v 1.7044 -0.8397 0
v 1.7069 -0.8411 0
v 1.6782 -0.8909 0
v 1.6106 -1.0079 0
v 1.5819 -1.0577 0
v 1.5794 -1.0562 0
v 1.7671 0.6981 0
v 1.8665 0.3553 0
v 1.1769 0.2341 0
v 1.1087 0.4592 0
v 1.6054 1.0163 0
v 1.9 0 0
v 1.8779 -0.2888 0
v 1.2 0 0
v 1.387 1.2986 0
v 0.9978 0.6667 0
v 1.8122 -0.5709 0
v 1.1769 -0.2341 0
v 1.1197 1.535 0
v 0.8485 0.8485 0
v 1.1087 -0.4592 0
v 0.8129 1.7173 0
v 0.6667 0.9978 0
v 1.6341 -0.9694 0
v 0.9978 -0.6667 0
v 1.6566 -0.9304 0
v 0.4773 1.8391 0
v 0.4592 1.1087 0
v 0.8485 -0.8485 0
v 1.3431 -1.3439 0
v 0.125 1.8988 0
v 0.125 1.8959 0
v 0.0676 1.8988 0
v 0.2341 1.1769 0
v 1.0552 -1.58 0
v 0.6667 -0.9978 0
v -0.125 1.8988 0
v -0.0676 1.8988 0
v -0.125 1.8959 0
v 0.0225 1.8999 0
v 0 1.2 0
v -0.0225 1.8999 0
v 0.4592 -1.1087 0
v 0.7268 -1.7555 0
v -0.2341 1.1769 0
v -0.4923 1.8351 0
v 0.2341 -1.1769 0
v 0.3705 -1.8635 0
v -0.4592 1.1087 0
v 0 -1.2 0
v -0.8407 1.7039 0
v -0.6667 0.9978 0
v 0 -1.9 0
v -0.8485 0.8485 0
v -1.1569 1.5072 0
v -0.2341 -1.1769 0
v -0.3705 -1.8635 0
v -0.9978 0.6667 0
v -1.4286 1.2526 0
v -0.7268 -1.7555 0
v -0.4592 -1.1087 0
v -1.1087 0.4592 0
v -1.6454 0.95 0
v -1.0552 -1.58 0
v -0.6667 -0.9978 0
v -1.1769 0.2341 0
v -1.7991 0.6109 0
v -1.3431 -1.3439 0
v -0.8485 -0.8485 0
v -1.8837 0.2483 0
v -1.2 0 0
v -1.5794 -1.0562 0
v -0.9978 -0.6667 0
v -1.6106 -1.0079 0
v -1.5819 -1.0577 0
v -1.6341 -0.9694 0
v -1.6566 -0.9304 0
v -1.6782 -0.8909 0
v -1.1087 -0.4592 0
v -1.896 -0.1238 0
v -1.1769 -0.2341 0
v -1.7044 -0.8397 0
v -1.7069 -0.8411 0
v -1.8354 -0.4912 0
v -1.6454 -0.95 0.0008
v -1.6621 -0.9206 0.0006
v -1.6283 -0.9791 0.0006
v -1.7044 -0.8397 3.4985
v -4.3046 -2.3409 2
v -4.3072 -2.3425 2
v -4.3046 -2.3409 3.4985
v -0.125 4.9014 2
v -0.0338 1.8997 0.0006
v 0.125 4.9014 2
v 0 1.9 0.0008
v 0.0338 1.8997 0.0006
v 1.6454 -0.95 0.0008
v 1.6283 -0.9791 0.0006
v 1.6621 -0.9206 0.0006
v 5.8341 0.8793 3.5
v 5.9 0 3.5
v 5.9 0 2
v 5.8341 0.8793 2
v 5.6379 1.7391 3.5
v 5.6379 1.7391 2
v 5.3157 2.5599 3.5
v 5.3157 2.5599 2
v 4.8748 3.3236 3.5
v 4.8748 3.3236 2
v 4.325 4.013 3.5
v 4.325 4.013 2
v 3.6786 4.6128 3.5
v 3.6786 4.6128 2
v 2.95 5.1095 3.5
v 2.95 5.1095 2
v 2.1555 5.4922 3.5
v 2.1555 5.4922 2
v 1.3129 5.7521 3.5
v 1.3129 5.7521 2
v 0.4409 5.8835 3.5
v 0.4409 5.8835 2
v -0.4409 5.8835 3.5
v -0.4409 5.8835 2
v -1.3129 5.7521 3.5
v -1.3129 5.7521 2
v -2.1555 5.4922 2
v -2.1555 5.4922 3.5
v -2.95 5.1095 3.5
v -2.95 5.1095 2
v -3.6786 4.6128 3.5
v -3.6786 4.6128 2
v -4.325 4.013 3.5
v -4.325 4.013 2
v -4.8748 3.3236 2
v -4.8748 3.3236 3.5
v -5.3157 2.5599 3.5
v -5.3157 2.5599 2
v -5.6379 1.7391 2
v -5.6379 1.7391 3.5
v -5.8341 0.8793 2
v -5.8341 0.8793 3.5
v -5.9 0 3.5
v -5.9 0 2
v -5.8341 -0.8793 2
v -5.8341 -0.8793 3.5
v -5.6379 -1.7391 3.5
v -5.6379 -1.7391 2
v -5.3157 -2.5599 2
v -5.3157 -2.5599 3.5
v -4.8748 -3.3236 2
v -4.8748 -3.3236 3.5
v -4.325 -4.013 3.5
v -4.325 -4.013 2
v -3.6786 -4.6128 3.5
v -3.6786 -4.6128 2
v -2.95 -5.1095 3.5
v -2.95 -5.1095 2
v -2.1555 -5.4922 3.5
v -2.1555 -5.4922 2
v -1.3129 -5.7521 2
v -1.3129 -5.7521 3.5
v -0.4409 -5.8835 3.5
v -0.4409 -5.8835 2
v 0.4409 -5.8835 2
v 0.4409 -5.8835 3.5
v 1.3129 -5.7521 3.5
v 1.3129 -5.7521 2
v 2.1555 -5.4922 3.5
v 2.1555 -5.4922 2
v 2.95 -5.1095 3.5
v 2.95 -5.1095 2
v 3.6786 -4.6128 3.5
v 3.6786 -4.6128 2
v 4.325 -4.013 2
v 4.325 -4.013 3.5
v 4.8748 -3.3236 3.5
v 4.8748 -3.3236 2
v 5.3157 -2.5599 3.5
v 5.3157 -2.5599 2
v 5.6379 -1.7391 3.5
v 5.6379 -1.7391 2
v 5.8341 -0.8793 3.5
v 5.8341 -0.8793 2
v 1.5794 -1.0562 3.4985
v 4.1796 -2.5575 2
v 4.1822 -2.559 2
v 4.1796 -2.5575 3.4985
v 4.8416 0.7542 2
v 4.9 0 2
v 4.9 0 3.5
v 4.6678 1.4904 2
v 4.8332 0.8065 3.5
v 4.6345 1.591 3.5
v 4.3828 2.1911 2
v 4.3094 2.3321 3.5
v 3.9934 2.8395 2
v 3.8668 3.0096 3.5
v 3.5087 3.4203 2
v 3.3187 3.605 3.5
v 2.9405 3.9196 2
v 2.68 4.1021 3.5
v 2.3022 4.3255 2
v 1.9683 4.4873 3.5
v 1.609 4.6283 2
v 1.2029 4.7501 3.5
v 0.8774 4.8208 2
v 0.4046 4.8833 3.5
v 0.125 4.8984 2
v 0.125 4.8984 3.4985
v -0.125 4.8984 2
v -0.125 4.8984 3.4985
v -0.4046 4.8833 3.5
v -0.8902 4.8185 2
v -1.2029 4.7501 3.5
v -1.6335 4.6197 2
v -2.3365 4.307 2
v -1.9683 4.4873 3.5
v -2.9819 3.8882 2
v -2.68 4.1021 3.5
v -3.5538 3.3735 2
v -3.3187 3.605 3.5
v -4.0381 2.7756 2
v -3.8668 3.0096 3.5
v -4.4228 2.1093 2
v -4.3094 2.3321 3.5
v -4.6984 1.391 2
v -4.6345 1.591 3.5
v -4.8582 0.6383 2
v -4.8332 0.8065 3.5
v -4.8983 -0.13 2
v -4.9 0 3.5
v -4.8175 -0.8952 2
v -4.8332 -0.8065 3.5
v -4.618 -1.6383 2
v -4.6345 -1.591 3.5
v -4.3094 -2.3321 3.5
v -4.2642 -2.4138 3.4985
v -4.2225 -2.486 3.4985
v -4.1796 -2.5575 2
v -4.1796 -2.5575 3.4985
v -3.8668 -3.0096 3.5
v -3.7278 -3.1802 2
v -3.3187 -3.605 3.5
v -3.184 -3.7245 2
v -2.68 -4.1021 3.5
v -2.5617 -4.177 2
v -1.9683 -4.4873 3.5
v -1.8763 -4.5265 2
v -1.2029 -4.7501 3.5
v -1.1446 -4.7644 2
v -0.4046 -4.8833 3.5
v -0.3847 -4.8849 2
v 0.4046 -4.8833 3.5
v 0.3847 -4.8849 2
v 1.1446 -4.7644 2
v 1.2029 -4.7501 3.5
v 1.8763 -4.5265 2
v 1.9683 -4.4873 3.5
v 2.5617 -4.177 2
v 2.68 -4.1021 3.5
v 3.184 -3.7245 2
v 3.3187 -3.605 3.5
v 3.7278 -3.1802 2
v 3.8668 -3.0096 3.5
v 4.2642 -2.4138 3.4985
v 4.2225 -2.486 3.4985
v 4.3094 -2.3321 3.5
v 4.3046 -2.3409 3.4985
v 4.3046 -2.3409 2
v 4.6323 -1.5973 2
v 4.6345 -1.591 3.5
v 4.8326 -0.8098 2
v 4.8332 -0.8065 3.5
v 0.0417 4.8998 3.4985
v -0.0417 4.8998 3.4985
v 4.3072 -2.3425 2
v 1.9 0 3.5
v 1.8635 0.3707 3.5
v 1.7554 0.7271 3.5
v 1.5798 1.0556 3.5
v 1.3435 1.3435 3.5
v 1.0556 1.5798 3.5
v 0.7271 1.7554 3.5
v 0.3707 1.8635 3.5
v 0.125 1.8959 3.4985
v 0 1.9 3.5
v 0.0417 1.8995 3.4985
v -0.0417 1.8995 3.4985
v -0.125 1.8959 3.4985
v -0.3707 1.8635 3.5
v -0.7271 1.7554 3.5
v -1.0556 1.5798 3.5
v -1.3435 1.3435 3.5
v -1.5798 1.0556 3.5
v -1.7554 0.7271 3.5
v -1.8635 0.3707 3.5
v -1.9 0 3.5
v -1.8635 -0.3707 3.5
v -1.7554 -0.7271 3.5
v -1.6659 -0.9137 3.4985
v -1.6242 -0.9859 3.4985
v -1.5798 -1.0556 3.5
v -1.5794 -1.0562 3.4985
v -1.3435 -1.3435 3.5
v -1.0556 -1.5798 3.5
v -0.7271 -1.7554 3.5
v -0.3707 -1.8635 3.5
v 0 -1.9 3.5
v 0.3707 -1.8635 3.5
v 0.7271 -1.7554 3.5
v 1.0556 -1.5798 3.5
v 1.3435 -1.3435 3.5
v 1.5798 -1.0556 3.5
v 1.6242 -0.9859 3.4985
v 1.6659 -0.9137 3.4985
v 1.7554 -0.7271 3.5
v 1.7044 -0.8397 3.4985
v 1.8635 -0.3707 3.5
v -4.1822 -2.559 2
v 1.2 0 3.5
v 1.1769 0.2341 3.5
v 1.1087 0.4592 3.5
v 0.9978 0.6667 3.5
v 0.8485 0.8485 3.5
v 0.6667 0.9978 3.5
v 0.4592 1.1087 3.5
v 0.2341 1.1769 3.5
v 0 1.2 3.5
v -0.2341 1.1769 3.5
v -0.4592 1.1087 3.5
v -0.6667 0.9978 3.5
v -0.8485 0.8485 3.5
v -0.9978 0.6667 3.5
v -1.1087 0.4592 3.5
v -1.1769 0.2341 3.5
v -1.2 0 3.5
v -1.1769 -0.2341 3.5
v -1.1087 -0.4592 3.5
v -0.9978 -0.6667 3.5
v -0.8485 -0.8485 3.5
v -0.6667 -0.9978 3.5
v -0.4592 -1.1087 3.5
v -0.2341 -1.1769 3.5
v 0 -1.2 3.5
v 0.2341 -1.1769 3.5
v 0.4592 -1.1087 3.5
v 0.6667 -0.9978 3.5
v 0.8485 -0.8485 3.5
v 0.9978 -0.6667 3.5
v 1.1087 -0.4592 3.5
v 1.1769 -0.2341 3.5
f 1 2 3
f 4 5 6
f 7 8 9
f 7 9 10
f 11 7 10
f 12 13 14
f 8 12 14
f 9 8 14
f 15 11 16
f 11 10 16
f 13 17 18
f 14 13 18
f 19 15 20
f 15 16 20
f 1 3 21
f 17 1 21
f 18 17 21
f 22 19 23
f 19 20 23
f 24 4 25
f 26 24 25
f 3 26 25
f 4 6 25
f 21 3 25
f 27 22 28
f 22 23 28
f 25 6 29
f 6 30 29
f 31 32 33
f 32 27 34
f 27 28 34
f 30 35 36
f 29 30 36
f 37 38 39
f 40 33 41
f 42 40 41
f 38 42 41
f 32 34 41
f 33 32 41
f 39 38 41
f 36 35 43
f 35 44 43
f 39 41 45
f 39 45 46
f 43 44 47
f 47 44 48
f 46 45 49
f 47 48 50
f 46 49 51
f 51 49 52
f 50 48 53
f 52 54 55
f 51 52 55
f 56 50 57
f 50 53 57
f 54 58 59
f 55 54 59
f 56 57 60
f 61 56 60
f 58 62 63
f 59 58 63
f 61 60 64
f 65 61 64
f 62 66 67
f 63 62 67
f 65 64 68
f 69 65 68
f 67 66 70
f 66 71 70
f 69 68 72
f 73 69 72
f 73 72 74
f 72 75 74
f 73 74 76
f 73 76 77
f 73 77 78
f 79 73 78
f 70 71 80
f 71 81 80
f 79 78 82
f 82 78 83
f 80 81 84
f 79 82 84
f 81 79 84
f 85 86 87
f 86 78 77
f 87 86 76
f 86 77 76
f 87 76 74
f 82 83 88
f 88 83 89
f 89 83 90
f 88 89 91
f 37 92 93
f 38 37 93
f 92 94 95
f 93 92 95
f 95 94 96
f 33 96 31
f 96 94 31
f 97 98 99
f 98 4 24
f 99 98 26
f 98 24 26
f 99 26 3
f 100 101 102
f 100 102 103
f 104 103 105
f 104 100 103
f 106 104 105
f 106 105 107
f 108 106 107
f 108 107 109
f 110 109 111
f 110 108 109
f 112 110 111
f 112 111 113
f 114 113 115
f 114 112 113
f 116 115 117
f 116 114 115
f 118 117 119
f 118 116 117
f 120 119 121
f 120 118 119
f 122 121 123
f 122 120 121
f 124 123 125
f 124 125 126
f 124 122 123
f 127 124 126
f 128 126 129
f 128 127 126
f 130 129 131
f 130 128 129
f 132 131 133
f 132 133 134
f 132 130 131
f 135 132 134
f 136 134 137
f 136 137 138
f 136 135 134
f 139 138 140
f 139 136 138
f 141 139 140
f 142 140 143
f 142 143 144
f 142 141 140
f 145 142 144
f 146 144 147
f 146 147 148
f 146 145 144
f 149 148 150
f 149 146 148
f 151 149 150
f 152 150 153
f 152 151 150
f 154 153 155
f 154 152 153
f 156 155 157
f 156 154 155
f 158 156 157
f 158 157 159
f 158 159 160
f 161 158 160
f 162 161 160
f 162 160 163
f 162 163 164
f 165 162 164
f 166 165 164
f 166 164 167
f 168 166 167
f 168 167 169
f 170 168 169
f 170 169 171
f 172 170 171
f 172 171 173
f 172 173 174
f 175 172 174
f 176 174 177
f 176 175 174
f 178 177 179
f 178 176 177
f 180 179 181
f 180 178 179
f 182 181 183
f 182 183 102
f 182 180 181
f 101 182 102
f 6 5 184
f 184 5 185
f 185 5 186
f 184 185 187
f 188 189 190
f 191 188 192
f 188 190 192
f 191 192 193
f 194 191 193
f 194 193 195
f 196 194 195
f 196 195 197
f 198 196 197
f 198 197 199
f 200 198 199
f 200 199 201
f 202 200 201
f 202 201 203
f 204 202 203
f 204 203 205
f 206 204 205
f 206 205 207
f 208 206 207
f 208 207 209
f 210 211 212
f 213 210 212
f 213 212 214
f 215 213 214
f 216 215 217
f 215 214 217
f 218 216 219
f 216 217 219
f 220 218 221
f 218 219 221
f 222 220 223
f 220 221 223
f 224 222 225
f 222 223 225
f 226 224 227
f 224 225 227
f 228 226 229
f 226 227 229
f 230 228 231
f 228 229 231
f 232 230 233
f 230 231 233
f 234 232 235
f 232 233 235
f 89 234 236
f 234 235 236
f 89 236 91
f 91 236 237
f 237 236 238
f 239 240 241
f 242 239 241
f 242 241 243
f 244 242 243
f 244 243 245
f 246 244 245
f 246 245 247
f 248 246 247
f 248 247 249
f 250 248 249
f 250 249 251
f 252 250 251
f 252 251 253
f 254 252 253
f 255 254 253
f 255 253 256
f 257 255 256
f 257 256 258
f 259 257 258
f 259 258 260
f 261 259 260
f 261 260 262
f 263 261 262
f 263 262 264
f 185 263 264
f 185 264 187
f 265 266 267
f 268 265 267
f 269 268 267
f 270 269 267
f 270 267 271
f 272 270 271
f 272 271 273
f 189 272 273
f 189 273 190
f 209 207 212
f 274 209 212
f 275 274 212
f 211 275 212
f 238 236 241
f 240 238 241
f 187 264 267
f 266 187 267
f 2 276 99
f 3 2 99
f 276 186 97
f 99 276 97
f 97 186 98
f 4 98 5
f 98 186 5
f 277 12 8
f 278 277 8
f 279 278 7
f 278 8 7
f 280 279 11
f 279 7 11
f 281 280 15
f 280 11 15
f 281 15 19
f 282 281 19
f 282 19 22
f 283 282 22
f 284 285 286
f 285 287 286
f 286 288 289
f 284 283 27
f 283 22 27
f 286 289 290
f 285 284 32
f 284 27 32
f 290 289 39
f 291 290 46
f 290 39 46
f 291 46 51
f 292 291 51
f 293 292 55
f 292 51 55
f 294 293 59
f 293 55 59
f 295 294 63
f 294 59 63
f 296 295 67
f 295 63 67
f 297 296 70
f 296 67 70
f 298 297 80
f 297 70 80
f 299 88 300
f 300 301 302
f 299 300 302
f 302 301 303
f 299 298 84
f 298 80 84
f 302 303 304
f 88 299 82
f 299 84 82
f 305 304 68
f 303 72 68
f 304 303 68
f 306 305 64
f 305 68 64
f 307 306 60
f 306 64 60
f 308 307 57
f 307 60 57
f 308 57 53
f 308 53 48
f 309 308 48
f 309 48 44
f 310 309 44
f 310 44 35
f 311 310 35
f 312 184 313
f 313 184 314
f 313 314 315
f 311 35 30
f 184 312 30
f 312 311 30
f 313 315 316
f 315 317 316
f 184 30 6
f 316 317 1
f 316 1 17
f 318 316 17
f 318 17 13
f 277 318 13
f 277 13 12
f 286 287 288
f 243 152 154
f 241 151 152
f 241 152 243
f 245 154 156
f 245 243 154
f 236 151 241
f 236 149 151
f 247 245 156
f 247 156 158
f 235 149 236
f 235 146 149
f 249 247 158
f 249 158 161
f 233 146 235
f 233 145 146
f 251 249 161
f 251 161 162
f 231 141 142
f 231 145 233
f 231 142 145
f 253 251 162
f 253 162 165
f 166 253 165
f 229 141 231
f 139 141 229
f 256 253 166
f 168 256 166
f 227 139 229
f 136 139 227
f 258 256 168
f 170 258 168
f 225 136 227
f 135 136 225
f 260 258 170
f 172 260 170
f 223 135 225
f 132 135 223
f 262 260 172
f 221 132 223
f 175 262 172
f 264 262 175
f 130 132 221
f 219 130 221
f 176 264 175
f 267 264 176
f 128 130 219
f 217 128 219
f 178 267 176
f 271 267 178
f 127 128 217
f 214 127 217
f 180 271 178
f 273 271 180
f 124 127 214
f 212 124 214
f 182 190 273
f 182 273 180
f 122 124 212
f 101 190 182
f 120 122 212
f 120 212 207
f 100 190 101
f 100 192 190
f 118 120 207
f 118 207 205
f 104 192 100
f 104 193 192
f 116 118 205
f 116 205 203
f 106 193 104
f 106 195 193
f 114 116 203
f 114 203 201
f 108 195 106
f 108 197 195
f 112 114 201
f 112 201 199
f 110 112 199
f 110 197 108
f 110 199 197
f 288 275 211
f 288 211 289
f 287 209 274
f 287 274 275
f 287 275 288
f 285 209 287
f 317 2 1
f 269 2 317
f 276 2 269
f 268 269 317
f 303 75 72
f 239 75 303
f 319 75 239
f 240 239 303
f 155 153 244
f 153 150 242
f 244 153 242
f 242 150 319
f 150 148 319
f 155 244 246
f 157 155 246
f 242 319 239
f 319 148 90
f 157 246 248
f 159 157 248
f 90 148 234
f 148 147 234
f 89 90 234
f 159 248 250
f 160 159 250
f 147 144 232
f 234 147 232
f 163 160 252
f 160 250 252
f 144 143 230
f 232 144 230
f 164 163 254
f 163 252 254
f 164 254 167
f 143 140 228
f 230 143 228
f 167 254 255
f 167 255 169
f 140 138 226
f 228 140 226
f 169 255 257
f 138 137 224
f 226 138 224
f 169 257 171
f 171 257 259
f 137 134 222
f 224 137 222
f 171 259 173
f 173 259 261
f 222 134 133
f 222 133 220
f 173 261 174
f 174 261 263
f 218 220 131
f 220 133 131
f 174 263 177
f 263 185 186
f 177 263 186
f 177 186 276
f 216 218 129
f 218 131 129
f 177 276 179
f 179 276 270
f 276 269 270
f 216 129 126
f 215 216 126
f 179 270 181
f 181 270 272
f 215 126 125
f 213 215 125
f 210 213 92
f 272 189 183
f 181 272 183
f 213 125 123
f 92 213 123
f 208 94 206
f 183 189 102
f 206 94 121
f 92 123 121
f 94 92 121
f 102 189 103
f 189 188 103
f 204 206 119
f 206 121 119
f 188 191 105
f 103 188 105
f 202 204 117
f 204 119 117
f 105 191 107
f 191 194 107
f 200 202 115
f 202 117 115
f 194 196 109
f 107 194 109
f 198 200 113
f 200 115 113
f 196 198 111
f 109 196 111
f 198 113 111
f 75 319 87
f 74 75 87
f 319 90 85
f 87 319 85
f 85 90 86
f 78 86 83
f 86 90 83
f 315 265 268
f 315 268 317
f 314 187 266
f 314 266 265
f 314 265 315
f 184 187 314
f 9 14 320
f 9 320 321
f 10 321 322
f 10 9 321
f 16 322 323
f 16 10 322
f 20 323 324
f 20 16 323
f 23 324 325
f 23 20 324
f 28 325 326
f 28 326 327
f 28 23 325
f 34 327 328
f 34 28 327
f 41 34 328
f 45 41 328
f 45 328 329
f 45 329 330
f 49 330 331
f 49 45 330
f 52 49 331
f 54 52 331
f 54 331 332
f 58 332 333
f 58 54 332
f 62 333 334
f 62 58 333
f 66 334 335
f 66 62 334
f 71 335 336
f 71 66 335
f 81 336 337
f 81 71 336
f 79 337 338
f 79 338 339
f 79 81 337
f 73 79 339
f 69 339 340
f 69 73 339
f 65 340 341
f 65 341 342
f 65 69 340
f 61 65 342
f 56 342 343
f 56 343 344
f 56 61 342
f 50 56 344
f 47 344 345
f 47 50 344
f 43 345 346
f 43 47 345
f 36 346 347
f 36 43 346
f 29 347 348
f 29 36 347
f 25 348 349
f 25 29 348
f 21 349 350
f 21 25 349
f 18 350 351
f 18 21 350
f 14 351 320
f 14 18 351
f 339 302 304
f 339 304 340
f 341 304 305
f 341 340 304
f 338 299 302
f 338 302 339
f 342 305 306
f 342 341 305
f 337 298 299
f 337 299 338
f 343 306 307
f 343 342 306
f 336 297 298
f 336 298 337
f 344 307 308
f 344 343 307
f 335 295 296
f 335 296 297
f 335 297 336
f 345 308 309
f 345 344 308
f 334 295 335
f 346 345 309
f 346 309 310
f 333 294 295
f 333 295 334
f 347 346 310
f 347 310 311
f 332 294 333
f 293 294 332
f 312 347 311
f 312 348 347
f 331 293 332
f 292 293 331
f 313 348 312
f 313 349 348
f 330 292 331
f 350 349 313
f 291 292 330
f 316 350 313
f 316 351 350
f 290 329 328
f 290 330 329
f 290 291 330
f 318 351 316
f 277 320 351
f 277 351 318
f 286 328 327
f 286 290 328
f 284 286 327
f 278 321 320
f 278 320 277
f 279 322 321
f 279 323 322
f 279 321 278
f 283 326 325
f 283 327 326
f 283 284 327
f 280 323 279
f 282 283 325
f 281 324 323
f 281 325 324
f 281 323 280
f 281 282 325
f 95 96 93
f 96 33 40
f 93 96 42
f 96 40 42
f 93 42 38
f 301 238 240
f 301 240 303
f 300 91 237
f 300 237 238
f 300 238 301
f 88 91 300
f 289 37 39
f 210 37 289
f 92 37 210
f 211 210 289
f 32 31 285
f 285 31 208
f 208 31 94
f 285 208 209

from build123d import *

# Parameters (mm, degrees)
SKETCH1_R           = 1.9
SKETCH1_R_2         = 1.2
BOSS_EXTRUDE1_DEPTH = 3.5
SKETCH2_R           = 5.9
SKETCH2_R_2         = 4.9
BOSS_EXTRUDE2_DEPTH = 1.5
BOSS_EXTRUDE3_DEPTH = 0.125
CIRPATTERN1_COUNT   = 3


with BuildPart() as part:
    # Sketch1 → Boss-Extrude1 (new body)
    with BuildSketch(Plane.XY):
        Circle(SKETCH1_R)
        Circle(SKETCH1_R_2, mode=Mode.SUBTRACT)
    extrude(amount=BOSS_EXTRUDE1_DEPTH)



with BuildPart() as body_2:
    # Sketch2 → Boss-Extrude2 (new body)
    with BuildSketch(Plane.XY.offset(3.5)):
        Circle(SKETCH2_R)
        Circle(SKETCH2_R_2, mode=Mode.SUBTRACT)
    extrude(amount=-BOSS_EXTRUDE2_DEPTH)


with BuildPart() as part_1:
    add(part.part)

    add(body_2.part)  # Boss-Extrude3 merges body 2
    # Sketch7 → Boss-Extrude3 (add, symmetric)
    with BuildSketch(Plane(origin=(0, 0, 0), x_dir=(0, 0, -1), z_dir=(1, 0, 0))):
        Polygon((-3.498505426, 1.898798754), (-3.498505426, 4.906659039), (-2.003497041, 4.906659039), (0, 1.898798754), (0, 1.698798754), (-3.498505426, 1.698798754), align=None)
    boss_extrude3 = extrude(amount=BOSS_EXTRUDE3_DEPTH, both=True)

    # CirPattern1: Boss-Extrude3 ×3 about axis
    cirpattern1_axis = Axis((0, 0, 3.5), (0, 0, -1))
    for i in range(1, CIRPATTERN1_COUNT):
        add(boss_extrude3.rotate(cirpattern1_axis, i * 360 / CIRPATTERN1_COUNT))


solid = part_1.part
